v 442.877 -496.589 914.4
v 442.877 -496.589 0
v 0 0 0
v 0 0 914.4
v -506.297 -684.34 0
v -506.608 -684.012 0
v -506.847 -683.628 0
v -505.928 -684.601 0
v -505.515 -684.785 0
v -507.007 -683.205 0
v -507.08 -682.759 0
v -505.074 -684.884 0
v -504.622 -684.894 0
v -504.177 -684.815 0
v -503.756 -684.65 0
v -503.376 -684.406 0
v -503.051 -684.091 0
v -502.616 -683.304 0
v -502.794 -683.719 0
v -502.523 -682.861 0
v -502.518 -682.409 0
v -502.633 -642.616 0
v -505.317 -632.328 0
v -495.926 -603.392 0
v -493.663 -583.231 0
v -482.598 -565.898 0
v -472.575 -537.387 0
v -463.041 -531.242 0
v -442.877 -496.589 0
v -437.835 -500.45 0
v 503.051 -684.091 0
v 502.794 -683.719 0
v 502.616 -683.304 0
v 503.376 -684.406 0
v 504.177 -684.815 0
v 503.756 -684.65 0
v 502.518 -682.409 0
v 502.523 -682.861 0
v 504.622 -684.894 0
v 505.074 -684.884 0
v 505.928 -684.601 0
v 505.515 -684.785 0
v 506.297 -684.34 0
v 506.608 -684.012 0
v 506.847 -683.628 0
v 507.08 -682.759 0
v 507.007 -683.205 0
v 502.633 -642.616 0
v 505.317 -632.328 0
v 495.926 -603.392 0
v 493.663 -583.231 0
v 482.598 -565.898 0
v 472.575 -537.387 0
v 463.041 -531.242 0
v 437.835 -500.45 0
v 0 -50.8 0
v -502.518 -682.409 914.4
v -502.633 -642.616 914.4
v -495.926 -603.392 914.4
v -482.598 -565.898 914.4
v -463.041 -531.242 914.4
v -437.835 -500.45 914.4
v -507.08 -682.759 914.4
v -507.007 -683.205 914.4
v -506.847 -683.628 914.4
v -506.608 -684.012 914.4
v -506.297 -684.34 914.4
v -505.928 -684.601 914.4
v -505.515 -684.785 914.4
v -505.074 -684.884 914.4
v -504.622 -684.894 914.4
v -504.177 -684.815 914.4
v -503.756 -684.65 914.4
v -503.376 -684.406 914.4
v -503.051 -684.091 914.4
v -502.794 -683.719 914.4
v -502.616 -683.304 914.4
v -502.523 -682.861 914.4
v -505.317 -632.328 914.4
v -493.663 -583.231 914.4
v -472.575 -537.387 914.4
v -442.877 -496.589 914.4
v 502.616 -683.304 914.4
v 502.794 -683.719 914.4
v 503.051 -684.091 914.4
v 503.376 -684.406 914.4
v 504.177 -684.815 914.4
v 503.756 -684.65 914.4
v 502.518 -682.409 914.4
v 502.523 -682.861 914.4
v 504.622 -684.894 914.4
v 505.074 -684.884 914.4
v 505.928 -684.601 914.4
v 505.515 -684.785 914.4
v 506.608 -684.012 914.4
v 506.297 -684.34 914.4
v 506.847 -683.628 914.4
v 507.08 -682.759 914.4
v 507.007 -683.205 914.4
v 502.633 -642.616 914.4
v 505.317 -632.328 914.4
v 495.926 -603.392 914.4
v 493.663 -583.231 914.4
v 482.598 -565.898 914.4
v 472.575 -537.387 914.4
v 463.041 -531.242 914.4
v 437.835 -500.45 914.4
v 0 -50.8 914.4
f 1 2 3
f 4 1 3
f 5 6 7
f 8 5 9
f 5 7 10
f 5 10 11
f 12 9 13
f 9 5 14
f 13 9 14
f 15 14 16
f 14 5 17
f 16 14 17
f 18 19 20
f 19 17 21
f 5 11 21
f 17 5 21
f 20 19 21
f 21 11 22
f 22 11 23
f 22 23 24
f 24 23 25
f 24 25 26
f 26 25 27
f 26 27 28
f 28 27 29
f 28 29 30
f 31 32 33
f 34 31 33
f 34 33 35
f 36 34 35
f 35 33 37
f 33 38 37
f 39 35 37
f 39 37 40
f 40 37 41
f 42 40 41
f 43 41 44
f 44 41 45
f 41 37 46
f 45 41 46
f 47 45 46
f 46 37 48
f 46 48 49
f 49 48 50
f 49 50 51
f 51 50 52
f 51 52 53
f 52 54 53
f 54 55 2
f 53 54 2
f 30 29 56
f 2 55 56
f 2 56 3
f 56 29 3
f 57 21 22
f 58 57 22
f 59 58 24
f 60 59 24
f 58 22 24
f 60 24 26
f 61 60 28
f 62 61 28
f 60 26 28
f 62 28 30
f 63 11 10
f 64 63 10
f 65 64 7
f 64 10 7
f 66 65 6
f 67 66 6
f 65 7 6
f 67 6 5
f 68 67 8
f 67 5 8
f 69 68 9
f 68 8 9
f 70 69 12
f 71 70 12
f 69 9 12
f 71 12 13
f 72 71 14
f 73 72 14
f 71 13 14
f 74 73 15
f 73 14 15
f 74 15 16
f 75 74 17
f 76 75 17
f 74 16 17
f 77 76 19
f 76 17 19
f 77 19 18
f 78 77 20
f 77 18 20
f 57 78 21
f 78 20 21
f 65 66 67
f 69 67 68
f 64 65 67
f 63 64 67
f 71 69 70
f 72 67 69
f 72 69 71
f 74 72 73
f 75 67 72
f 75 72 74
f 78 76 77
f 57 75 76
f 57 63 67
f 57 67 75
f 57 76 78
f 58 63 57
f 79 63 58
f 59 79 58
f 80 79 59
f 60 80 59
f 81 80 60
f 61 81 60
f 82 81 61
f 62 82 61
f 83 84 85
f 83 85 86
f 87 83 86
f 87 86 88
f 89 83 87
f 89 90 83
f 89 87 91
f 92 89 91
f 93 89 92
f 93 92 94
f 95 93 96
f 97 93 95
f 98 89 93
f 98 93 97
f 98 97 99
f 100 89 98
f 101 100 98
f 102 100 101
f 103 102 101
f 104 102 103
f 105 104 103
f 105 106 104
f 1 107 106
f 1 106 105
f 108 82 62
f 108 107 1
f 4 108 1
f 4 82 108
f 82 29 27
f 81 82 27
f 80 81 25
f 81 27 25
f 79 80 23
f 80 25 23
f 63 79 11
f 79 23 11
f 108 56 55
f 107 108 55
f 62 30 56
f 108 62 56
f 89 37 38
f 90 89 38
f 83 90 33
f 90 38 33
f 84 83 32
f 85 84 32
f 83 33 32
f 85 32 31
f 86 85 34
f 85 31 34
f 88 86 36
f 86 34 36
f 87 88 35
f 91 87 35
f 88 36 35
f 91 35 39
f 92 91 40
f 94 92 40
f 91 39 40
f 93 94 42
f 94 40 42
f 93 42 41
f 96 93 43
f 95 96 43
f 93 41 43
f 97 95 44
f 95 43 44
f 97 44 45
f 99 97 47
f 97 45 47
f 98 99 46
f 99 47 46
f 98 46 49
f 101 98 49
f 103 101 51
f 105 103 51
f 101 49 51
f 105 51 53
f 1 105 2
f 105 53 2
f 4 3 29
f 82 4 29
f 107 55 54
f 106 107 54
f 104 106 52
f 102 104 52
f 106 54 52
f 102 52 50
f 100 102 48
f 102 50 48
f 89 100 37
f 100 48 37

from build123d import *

# Parameters (mm, degrees)
F1_DEPTH = 914.4


with BuildPart() as f1:
    # F0 (on Top) → F1 (new body)
    with BuildSketch(Plane.XY):
        with BuildLine():
            Line((442.876746, -496.589411), (0, 0))
            Line((0, 0), (-442.876746, -496.589411))
            ThreePointArc((-442.876746, -496.589411), (-493.663388, -583.230539), (-507.080321, -682.759199))
            ThreePointArc((-507.080321, -682.759199), (-504.622043, -684.893954), (-502.518043, -682.409302))
            ThreePointArc((-502.518043, -682.409302), (-490.069762, -584.357788), (-437.834835, -500.449675))
            Line((-437.834835, -500.449675), (0, -50.8))
            Line((0, -50.8), (437.834835, -500.449675))
            ThreePointArc((437.834835, -500.449675), (490.069762, -584.357788), (502.518043, -682.409302))
            ThreePointArc((502.518043, -682.409302), (504.622043, -684.893954), (507.080321, -682.759199))
            ThreePointArc((507.080321, -682.759199), (493.663388, -583.230539), (442.876746, -496.589411))
        make_face()
    extrude(amount=F1_DEPTH)


solid = f1.part
